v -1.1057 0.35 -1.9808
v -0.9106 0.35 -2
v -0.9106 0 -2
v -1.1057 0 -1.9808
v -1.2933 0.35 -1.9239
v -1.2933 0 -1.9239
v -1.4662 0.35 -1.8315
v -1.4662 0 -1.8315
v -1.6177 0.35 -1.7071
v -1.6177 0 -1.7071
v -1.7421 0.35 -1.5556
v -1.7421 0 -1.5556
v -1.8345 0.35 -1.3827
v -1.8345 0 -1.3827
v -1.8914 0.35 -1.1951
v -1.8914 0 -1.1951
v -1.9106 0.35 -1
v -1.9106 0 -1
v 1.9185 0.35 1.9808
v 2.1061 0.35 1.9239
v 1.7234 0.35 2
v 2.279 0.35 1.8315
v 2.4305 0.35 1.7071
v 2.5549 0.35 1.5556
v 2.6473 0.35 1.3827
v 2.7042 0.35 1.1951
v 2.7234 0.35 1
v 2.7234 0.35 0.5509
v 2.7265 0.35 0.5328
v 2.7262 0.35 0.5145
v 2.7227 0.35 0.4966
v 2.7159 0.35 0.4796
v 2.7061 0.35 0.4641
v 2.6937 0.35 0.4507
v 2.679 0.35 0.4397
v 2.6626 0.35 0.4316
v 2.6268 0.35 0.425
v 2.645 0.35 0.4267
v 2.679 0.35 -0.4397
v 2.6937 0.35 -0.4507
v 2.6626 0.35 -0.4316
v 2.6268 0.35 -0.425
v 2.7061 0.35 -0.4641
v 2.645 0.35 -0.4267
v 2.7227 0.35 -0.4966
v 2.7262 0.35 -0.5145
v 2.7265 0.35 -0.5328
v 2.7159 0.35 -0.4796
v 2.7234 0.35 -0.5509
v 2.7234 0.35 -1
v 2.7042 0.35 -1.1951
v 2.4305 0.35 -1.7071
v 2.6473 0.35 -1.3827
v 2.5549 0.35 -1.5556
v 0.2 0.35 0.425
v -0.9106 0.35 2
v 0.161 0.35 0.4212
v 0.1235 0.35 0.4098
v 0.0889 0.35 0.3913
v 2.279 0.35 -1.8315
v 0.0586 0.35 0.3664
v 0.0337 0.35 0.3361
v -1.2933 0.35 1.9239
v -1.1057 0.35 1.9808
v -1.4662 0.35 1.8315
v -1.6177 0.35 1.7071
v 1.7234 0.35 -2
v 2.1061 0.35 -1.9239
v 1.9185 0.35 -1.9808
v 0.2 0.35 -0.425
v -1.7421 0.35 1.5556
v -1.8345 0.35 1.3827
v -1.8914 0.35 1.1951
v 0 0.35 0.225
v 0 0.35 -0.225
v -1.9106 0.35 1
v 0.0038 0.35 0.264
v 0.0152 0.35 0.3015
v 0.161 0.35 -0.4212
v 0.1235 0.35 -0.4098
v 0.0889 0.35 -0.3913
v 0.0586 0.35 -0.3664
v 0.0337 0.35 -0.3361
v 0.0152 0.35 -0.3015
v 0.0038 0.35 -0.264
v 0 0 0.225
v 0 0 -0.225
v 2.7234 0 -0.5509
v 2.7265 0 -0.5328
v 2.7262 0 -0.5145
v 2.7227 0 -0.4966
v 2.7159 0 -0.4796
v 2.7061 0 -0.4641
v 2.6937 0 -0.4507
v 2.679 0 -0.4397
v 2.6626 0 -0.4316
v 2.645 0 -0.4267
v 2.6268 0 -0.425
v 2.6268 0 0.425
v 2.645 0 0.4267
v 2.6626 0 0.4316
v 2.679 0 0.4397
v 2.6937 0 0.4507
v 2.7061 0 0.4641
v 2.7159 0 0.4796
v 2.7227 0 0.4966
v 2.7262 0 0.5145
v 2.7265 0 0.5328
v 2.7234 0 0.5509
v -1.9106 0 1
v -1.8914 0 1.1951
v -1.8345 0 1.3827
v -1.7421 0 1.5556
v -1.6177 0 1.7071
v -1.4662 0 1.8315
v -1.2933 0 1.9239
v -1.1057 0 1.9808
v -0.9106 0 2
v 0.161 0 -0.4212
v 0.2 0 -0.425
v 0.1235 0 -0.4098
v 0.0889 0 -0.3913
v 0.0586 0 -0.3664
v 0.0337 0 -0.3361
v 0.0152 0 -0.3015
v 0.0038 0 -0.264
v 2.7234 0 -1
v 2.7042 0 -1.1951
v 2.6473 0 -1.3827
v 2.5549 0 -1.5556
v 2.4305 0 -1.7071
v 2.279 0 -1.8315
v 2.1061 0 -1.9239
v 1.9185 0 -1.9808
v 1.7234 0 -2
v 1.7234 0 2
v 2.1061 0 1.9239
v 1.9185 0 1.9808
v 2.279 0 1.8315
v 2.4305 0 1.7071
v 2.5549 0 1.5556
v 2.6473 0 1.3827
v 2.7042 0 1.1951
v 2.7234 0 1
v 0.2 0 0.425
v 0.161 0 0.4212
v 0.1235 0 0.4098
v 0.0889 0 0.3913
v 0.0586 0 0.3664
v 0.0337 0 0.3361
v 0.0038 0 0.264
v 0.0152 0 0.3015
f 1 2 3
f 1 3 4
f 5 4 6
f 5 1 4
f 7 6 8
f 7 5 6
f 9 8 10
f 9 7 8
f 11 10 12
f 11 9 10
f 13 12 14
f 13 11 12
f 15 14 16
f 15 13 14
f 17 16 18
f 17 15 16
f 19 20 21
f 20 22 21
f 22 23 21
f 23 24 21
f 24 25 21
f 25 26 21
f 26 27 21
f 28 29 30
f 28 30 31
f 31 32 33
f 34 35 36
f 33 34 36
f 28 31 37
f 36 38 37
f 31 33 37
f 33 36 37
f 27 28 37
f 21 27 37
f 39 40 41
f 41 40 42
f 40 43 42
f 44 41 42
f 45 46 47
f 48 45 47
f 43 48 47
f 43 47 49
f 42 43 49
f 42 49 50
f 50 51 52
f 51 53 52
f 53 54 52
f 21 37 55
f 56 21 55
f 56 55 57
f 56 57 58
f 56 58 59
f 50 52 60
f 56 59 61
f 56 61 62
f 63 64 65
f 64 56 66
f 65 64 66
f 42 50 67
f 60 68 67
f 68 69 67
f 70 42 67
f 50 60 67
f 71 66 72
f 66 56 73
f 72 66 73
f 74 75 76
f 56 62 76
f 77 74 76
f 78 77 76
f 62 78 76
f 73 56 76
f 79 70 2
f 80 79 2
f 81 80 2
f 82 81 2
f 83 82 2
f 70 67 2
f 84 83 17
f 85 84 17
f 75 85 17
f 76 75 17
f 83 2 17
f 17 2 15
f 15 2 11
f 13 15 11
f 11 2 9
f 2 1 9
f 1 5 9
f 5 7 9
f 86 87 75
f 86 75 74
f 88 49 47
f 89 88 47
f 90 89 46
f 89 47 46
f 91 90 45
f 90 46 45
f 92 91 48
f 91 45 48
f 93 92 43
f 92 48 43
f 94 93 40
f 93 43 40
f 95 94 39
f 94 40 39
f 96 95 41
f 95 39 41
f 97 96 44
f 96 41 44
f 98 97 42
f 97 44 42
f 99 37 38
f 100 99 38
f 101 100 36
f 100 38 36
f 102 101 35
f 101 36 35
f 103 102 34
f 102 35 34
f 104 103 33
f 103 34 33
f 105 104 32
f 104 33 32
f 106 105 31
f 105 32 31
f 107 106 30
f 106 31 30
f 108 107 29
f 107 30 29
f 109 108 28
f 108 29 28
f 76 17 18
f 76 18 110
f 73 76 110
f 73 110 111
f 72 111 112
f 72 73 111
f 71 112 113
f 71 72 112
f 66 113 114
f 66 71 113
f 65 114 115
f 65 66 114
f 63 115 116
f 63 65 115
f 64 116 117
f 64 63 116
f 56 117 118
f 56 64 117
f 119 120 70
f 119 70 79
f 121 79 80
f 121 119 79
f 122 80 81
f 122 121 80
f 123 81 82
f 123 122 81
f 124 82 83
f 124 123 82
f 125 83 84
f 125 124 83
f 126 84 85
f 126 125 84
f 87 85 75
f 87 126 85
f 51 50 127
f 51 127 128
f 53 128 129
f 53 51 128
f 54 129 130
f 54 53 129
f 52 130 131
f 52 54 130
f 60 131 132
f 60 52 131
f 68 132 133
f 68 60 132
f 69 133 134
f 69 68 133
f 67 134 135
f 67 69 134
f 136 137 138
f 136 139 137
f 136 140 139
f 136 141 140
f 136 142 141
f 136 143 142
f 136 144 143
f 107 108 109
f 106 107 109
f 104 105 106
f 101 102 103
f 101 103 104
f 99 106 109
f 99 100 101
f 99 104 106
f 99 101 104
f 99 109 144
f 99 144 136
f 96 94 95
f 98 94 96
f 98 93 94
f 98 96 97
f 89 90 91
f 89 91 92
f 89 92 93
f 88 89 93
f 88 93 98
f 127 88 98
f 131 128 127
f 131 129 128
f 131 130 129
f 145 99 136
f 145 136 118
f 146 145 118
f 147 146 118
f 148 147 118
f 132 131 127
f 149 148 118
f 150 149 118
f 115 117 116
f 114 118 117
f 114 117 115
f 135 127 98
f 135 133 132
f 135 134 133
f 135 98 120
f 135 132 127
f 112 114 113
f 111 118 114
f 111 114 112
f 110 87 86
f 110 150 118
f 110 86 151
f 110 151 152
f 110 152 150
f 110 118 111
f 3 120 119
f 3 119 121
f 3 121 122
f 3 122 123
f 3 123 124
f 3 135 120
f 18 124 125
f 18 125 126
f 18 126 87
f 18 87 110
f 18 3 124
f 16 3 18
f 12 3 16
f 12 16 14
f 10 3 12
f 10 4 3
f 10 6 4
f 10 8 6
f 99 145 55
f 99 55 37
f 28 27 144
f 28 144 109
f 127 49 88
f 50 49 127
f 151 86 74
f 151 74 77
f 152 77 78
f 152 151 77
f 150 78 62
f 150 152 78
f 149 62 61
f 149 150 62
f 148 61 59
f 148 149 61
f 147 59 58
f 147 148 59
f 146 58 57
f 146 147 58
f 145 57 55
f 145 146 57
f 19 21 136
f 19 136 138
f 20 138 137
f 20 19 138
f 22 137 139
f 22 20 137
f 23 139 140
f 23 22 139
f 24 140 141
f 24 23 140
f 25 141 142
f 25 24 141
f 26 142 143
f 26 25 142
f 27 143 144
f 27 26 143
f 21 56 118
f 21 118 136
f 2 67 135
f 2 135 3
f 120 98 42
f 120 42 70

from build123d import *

# Parameters (mm, degrees)
BOSS_EXTRUDE1_DEPTH = 0.35
FILLET1_R           = 0.1
BOSS_EXTRUDE3_DEPTH = 0.35


with BuildPart() as part:
    # Sketch1 → Boss-Extrude1 (new body)
    with BuildSketch(Plane(origin=(0, 0, 0), x_dir=(1, 0, 0), z_dir=(0, 1, 0))):
        with BuildLine():
            Line((0, 0.225), (0, -0.225))
            ThreePointArc((0, -0.225), (0.058578644, -0.366421356), (0.2, -0.425))
            Line((0.2, -0.425), (3, -0.425))
            Line((3, -0.425), (1.614359354, -1.225))
            Line((1.614359354, -1.225), (-0.385640646, -1.225))
            Line((-0.385640646, -1.225), (-1.110640646, -0.5))
            Line((-1.110640646, -0.5), (-1.410640646, -0.5))
            ThreePointArc((-1.410640646, -0.5), (-1.910640646, 0), (-1.410640646, 0.5))
            Line((-1.410640646, 0.5), (-1.110640646, 0.5))
            Line((-1.110640646, 0.5), (-0.385640646, 1.225))
            Line((-0.385640646, 1.225), (1.614359354, 1.225))
            Line((1.614359354, 1.225), (3, 0.425))
            Line((3, 0.425), (0.2, 0.425))
            ThreePointArc((0.2, 0.425), (0.058578644, 0.366421356), (0, 0.225))
        make_face()
    extrude(amount=BOSS_EXTRUDE1_DEPTH)

    # Fillet1
    fillet1_edges = [part.edges().sort_by_distance(p)[0] for p in [
        (3, 0.175, -0.425),
        (3, 0.175, 0.425),
    ]]
    fillet(fillet1_edges, radius=FILLET1_R)

    # Sketch3 → Boss-Extrude3 (add)
    with BuildSketch(Plane(origin=(0, 0.35, 0), x_dir=(1, 0, 0), z_dir=(0, 1, 0))):
        with BuildLine():
            Line((2.723387502, 0.499118095), (2.723387502, 1))
            ThreePointArc((2.723387502, 1), (2.430494283, 1.707106781), (1.723387502, 2))
            Line((1.723387502, 2), (-0.910640646, 2))
            ThreePointArc((-0.910640646, 2), (-1.617747427, 1.707106781), (-1.910640646, 1))
            Line((-1.910640646, 1), (-1.910640646, -1))
            ThreePointArc((-1.910640646, -1), (-1.617747427, -1.707106781), (-0.910640646, -2))
            Line((-0.910640646, -2), (1.723387502, -2))
            ThreePointArc((1.723387502, -2), (2.430494283, -1.707106781), (2.723387502, -1))
            Line((2.723387502, -1), (2.723387502, -0.499118095))
            Line((2.723387502, -0.499118095), (-0.276612498, -0.499118095))
            Line((-0.276612498, -0.499118095), (-0.276612498, 0.499118095))
            Line((-0.276612498, 0.499118095), (2.723387502, 0.499118095))
        make_face()
    extrude(amount=-BOSS_EXTRUDE3_DEPTH)


solid = part.part
